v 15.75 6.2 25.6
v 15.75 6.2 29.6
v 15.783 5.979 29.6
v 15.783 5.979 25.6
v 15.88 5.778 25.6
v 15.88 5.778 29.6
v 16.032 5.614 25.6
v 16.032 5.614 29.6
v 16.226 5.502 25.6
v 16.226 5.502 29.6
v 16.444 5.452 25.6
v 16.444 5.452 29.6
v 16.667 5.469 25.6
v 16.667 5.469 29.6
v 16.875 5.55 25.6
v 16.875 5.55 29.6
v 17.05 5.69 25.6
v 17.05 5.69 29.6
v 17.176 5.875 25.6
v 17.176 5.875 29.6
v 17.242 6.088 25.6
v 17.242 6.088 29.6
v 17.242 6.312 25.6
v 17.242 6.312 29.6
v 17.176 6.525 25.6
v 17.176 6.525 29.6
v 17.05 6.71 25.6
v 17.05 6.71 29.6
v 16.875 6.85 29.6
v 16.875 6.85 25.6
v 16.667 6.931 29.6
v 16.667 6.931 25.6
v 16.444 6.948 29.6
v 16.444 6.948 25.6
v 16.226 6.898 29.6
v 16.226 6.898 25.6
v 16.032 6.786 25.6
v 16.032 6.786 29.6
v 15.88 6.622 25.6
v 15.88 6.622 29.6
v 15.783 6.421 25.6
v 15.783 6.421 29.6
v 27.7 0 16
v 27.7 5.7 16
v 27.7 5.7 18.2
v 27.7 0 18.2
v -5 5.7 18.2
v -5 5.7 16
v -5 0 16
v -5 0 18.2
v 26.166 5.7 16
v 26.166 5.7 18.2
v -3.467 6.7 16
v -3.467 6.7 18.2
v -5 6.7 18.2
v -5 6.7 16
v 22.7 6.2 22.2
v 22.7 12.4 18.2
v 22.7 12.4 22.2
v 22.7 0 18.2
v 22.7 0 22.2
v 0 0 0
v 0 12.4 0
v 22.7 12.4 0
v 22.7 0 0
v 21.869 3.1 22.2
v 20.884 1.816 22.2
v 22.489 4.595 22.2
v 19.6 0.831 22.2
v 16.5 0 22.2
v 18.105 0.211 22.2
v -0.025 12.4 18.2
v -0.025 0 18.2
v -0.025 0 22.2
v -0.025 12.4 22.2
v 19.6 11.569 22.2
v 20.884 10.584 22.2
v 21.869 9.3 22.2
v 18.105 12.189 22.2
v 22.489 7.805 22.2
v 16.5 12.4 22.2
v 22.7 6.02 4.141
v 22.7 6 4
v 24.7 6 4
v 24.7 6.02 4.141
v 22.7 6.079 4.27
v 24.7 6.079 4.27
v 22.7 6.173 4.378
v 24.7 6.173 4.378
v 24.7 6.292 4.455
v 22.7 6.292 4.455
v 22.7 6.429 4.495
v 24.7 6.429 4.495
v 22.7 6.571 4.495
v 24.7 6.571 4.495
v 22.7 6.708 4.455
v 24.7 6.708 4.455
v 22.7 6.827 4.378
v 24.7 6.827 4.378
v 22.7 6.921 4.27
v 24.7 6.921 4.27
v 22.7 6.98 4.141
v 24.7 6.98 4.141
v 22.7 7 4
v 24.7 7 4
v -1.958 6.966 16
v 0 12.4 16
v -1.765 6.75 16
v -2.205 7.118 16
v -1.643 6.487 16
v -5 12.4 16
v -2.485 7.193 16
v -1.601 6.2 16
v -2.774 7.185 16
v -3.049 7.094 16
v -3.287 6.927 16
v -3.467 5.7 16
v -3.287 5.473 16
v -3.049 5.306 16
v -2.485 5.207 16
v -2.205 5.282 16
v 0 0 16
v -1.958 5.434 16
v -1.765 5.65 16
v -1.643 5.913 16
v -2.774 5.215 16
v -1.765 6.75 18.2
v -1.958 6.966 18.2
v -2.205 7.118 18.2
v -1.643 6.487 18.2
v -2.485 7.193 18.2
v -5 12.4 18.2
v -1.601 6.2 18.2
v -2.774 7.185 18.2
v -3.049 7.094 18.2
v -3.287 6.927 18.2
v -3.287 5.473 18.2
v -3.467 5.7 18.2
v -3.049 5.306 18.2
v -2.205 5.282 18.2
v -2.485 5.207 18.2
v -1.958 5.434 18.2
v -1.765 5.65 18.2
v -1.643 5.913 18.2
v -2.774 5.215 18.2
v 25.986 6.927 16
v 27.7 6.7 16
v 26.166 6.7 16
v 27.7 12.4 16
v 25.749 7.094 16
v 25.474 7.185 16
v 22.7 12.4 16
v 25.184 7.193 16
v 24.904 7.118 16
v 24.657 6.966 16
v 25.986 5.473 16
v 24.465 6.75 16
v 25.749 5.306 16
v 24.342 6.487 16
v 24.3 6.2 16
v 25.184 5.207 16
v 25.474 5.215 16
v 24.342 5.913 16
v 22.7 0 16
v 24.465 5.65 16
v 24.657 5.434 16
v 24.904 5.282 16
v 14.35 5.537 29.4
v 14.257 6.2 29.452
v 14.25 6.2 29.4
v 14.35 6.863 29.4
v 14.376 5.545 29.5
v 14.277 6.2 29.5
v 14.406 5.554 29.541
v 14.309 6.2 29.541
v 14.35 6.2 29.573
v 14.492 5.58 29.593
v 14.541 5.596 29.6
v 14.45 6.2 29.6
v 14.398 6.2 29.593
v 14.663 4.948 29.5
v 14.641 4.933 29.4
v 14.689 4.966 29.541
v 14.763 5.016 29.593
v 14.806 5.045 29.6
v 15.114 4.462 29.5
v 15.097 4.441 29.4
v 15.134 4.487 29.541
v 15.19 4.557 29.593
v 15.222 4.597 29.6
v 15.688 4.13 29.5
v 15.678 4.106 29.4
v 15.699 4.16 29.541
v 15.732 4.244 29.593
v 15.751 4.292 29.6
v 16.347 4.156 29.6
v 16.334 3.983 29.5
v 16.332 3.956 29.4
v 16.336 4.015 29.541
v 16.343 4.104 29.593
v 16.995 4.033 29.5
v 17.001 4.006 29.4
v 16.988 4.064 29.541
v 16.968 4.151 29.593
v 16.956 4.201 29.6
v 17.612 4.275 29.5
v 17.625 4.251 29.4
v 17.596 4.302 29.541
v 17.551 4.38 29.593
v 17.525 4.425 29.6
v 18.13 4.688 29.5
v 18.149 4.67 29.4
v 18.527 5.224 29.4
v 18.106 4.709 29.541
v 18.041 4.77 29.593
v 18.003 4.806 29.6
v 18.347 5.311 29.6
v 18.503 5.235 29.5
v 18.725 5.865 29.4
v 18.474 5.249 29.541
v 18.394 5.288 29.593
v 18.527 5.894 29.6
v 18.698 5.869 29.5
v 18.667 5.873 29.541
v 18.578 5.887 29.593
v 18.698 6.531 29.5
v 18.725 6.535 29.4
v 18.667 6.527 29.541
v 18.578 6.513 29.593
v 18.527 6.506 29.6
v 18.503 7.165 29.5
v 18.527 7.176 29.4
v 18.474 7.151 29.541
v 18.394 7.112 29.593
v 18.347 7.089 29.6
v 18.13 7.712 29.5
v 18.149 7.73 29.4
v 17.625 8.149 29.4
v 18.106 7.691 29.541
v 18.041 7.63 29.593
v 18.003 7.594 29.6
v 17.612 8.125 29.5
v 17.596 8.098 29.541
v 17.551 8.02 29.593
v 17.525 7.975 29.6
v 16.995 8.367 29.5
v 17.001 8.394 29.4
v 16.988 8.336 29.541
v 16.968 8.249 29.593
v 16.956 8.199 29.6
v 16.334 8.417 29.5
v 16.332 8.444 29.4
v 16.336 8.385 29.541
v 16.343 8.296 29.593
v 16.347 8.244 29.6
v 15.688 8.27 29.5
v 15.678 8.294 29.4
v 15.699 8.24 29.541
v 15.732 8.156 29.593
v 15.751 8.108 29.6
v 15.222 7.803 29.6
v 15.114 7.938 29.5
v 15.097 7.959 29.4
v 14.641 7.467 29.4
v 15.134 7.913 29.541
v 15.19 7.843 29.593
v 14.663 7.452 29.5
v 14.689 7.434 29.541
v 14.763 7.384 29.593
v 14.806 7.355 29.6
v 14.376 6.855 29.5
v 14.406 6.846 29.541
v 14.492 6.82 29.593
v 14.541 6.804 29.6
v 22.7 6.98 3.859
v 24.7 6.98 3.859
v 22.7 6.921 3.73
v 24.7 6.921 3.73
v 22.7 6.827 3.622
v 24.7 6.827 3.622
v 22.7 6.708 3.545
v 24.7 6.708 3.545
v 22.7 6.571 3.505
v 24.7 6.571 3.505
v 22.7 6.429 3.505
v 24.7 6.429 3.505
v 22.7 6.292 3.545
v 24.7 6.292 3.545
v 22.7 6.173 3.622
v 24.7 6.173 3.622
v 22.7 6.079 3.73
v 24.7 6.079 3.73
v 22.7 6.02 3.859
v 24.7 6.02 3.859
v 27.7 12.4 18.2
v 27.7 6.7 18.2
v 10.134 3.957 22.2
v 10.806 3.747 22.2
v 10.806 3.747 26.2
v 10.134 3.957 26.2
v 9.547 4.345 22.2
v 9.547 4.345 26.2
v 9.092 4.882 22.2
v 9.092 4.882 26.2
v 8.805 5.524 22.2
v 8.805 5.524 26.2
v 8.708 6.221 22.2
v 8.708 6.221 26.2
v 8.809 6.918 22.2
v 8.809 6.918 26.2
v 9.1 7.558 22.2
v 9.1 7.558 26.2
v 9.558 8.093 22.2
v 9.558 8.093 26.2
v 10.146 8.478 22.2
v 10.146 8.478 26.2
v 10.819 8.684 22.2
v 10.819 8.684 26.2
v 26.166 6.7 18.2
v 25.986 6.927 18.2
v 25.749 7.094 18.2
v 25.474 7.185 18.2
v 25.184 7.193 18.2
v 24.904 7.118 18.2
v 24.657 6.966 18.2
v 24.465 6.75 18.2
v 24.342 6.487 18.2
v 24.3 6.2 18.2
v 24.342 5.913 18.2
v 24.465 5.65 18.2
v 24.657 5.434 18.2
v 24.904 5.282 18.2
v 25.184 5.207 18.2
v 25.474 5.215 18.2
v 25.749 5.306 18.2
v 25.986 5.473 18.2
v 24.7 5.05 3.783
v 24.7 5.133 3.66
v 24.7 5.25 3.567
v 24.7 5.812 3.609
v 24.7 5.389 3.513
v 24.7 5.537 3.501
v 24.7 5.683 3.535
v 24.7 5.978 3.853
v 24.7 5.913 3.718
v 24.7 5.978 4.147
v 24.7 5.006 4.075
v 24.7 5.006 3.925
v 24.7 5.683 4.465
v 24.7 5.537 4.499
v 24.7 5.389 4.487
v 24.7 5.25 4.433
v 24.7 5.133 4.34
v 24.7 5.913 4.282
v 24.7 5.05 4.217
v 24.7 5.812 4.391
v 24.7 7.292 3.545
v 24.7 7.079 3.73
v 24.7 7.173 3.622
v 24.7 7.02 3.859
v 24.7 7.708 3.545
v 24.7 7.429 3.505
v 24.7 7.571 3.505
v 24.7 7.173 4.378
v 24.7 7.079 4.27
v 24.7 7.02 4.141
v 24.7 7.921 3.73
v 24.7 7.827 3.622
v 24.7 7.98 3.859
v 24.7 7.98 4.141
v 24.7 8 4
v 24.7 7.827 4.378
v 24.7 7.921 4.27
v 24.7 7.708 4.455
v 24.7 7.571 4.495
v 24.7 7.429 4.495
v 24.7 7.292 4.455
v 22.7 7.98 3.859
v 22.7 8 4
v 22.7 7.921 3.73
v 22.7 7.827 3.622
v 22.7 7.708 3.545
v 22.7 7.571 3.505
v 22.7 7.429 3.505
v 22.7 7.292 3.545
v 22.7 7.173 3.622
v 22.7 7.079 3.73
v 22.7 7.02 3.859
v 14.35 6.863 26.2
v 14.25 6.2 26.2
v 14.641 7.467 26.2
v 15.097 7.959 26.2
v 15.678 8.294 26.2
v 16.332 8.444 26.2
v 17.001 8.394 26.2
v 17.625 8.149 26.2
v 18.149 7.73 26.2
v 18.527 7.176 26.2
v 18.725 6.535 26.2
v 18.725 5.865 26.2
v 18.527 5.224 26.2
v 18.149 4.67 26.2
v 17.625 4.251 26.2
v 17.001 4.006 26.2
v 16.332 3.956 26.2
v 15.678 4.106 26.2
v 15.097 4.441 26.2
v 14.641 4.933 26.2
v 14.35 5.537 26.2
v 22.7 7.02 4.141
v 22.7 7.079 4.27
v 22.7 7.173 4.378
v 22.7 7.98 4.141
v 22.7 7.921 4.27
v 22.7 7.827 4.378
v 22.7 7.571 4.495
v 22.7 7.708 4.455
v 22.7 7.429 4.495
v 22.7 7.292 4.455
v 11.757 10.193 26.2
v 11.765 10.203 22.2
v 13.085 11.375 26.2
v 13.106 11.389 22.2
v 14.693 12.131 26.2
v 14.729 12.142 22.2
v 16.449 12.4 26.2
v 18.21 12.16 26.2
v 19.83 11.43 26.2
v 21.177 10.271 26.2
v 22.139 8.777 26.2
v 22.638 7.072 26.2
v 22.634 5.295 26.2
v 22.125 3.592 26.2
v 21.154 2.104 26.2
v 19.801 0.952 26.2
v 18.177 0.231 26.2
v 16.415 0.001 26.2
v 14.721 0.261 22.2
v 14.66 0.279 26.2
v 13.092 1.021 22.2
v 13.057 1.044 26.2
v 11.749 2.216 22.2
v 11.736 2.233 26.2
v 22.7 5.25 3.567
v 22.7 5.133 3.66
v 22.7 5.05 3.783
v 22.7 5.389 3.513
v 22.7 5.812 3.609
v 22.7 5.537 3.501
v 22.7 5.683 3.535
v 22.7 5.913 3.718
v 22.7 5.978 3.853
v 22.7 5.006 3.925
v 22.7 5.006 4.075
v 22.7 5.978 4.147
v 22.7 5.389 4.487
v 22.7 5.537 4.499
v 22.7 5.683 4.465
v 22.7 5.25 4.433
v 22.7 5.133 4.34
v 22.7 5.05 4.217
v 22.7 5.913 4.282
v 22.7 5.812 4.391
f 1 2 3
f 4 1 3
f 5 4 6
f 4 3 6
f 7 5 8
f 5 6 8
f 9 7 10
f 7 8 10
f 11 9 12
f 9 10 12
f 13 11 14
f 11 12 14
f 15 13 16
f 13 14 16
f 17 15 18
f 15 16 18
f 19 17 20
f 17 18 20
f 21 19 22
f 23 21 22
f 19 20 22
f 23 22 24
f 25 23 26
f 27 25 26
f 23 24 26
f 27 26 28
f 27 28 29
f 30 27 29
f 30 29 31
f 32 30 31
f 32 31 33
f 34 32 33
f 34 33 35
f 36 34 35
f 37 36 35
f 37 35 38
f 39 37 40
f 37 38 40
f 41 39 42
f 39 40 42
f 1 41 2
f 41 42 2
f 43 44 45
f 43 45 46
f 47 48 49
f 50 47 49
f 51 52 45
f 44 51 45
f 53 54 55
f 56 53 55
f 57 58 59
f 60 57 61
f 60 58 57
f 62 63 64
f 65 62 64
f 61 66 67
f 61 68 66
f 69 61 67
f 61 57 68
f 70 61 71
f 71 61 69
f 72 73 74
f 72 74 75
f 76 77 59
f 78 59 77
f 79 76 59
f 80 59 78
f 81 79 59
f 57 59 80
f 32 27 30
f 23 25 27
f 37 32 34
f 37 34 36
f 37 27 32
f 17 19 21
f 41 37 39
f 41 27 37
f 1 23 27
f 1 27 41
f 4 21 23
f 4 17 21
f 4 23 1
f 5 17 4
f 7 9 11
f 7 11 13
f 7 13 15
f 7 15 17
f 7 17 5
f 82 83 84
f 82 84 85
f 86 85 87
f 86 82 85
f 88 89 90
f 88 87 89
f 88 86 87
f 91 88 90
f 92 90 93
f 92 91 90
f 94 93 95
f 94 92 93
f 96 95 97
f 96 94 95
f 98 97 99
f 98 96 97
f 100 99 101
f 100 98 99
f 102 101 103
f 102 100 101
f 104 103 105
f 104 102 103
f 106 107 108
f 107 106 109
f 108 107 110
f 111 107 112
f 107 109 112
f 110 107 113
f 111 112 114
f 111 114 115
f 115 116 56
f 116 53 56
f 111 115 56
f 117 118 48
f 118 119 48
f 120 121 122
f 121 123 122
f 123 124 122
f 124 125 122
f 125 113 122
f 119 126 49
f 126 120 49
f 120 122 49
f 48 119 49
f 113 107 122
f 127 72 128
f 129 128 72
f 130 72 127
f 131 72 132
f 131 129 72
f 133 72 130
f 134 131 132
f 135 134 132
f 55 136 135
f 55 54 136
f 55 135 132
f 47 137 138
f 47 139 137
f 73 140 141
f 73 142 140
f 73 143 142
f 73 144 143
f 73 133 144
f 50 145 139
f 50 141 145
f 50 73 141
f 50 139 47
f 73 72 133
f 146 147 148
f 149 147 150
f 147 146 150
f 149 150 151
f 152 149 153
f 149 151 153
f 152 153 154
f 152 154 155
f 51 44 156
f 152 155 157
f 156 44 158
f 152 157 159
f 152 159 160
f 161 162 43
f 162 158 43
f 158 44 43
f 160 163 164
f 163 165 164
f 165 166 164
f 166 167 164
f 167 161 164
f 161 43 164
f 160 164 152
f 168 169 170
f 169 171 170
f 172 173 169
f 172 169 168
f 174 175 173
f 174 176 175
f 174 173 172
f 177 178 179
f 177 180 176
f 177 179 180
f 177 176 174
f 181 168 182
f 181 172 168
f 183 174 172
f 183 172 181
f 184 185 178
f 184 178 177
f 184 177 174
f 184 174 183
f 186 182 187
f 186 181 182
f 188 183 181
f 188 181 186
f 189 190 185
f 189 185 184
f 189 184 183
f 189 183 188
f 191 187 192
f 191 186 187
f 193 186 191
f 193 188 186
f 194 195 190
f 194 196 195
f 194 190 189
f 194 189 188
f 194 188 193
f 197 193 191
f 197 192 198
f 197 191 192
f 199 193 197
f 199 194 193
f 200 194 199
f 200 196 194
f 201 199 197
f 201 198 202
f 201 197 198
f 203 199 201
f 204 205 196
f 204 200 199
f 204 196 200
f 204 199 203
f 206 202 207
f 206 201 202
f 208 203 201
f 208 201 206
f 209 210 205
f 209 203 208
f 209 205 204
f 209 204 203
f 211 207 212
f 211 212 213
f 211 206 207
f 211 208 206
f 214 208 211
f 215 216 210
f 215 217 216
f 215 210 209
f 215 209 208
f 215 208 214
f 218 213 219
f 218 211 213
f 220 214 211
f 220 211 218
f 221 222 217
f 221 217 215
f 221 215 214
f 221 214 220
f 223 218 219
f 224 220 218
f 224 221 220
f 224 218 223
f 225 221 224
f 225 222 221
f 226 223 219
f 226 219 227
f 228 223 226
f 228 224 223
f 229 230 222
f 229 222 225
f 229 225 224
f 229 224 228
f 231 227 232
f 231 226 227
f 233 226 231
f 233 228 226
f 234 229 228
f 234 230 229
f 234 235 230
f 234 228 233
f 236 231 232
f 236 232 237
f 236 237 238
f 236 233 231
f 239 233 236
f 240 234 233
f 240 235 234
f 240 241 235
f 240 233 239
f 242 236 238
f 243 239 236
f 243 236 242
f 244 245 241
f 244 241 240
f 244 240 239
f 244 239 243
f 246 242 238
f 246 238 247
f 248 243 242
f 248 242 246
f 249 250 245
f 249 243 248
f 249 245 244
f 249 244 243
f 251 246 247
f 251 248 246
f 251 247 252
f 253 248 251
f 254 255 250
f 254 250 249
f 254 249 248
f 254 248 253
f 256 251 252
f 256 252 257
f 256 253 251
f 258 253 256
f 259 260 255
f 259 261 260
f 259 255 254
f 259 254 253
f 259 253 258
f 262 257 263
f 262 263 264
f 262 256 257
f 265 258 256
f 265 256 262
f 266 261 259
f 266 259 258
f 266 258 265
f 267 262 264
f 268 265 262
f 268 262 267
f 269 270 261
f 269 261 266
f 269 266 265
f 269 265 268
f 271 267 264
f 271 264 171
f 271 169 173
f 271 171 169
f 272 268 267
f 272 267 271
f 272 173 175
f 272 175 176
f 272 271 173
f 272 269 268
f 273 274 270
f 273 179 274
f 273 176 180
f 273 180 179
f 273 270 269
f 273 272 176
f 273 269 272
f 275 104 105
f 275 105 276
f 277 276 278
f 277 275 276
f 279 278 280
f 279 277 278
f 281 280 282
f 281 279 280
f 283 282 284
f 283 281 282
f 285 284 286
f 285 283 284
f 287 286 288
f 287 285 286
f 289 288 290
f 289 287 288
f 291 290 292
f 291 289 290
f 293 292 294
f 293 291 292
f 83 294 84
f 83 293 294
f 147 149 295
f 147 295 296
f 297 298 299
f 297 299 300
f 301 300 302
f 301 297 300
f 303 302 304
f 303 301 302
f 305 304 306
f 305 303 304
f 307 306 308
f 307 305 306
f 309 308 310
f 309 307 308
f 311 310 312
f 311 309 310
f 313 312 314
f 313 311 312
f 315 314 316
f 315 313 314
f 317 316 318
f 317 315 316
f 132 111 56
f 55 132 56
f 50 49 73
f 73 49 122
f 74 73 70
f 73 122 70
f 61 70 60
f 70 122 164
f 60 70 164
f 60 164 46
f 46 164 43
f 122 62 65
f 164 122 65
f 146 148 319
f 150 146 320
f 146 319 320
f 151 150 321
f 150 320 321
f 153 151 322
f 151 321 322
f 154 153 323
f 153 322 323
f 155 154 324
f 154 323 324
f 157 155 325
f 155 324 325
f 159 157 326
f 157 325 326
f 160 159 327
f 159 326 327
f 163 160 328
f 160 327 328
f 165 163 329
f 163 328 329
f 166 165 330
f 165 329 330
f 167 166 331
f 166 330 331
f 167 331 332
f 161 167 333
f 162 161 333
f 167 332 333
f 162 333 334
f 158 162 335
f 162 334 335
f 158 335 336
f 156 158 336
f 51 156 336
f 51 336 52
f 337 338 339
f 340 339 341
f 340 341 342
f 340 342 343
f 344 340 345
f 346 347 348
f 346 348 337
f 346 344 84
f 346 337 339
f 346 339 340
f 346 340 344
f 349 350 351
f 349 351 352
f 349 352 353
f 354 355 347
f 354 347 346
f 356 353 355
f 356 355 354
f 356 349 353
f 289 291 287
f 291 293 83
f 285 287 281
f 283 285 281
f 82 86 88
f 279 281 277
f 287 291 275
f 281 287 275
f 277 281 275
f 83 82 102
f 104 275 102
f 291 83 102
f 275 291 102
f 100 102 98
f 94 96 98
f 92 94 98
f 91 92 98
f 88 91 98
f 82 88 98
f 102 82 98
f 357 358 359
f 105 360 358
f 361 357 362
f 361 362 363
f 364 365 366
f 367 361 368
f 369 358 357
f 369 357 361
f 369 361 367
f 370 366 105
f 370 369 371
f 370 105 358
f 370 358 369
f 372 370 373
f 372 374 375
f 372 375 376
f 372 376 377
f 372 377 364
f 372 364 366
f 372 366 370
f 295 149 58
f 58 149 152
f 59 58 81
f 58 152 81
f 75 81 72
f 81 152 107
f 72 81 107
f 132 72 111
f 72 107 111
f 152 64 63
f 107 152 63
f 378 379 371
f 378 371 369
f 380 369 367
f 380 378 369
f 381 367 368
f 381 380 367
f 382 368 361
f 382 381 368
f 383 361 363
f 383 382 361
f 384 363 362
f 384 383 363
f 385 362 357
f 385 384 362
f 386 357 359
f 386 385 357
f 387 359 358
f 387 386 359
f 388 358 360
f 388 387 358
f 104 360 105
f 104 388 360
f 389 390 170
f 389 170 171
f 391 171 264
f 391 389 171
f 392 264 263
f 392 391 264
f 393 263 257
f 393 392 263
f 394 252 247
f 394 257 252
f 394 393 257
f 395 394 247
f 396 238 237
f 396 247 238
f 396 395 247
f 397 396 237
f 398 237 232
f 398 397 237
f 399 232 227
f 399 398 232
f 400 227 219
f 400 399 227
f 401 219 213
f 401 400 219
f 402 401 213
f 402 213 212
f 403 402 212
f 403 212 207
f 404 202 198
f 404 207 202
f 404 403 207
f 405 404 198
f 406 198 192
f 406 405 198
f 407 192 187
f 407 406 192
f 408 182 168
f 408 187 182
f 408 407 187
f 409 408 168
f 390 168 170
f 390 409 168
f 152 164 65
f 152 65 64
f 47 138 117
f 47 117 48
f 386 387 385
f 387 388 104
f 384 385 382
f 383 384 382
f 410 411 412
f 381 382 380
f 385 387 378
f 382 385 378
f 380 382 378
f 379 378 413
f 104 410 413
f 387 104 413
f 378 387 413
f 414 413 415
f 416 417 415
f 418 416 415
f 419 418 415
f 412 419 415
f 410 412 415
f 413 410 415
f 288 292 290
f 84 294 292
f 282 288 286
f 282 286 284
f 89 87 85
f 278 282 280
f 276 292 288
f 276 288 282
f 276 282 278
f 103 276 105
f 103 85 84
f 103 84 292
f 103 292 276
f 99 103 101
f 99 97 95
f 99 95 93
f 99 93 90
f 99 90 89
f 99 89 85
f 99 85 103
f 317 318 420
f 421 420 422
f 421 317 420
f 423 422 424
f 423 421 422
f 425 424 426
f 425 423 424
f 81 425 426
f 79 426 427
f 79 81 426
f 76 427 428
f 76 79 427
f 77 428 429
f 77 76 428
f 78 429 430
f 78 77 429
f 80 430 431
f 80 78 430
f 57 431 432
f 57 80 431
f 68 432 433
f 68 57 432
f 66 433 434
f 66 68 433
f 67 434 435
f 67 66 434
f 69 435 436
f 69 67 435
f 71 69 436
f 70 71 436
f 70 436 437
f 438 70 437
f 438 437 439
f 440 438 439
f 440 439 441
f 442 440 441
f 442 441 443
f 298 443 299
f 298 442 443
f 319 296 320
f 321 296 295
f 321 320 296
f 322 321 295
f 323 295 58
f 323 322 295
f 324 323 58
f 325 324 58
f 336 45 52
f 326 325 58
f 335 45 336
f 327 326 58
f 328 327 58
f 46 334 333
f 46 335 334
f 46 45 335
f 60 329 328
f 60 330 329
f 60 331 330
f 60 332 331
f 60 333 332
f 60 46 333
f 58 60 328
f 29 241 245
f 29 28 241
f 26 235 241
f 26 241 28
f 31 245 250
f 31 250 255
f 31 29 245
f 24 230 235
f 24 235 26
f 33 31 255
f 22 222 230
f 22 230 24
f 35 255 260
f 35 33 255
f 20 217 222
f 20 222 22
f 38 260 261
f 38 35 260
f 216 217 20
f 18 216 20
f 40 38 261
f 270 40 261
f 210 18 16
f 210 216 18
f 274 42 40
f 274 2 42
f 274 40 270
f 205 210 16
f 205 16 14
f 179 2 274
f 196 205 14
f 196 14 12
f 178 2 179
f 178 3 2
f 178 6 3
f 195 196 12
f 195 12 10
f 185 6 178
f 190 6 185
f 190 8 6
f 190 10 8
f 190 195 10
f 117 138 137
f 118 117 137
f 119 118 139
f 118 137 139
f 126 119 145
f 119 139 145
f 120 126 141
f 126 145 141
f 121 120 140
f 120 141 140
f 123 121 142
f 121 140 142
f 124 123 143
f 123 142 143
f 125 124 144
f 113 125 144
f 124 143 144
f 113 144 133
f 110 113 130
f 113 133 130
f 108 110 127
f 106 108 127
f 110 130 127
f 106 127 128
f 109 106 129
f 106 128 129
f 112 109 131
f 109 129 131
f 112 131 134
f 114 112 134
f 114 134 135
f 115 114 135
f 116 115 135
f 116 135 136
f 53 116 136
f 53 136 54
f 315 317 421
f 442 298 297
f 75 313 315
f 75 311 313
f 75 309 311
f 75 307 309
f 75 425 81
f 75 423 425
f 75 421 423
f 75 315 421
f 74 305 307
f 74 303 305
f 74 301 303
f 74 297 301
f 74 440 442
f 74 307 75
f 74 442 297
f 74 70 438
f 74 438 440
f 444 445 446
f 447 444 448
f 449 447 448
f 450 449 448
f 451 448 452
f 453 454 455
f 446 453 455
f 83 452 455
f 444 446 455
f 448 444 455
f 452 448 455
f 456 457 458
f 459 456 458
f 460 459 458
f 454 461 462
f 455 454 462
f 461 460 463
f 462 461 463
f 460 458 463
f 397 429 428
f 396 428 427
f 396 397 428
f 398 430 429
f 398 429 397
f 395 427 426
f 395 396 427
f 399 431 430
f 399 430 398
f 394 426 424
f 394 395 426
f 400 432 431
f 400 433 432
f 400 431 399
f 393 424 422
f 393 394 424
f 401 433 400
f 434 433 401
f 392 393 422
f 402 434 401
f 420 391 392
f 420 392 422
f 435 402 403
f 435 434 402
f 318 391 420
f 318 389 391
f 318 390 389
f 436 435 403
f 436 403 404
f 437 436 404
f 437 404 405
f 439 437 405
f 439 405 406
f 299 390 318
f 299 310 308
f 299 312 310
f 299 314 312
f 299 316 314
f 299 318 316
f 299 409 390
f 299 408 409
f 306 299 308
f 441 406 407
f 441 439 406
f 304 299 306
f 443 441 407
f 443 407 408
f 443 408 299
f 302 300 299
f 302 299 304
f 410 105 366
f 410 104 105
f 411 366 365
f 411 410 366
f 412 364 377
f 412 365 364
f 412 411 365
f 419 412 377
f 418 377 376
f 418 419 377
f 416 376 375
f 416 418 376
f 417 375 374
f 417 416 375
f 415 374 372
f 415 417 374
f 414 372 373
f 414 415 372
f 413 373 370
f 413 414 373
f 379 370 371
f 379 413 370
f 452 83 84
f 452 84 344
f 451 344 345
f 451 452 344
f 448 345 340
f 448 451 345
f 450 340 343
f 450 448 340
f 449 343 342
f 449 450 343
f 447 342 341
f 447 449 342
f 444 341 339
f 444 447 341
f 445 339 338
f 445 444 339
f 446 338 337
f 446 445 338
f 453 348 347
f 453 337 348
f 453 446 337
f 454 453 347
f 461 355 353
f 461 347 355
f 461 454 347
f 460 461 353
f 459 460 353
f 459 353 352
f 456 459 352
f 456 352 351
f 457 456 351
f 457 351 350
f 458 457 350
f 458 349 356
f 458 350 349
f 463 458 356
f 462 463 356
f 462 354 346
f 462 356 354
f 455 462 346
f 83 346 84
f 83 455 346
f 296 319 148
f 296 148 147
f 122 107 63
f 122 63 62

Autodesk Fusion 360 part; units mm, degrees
sketch "alap" plane through (0, 0, 0) normal (0, 0, 1) x (1, 0, 0)
  line L0 (0, 0) -> (22.7, 0)
  line L1 (22.7, 0) -> (22.7, 12.4)
  line L2 (22.7, 12.4) -> (0, 12.4)
  line L3 (0, 12.4) -> (0, 0)
  dimension "d1" = 22.7
  dimension "d2" = 12.4
extrude "Extrude1" add sketch "alap" along normal blind 16 makes body 1
sketch "felso_alap" plane through (0, 0, 16) normal (0, 0, 1) x (-1, 0, 0)
  line L0 (0, 0) -> (-22.7, 0)
  line L1 (-22.7, -12.4) -> (0, -12.4)
  line L2 (0, 0) -> (-22.7, 0)
  line L3 (-22.7, 0) -> (-27.7, 0)
  line L4 (0, 0) -> (5, 0)
  line L5 (5, 0) -> (-22.7, 0)
  line L6 (-22.7, -12.4) -> (5, -12.4)
  line L7 (5, -12.4) -> (5, 0)
  line L8 (-27.7, 0) -> (-22.7, 0)
  line L9 (-22.7, -12.4) -> (-27.7, -12.4)
  line L10 (-27.7, -12.4) -> (-27.7, 0)
  dimension "d5" = 5
  dimension "d6" = 5
extrude "Extrude2" add sketch "felso_alap" along normal blind 2.2 bodies 1
sketch "felso_teto" plane through (0, 0, 18.2) normal (0, 0, 1) x (-1, 0, 0)
  line L0 (-27.7, -12.4) -> (5, -12.4)
  line L1 (5, -12.4) -> (5, 0)
  line L2 (5, 0) -> (-27.7, 0)
  line L3 (-27.7, 0) -> (-27.7, -12.4)
  line L4 (0.0248, -12.4) -> (-22.7, -12.4)
  line L5 (-22.7, -12.4) -> (-22.7, 0)
  line L6 (-22.7, 0) -> (0.0248, 0)
  line L7 (0.0248, 0) -> (0.0248, -12.4)
extrude "Extrude3" add sketch "felso_teto" along normal blind 4 separate body contours L0 L2 L4 L5 L6 L7 makes body 2
combine "Combine1" operation add target body 2 tool bodies 1
sketch "gear_haus" plane through (0, 0, 22.2) normal (0, 0, 1) x (-1, 0, 0)
  line L0 (0.0248, 0) -> (-22.7, 0)
  line L1 (-22.7, 0) -> (-22.7, -12.4)
  line L2 (-22.7, -12.4) -> (0.0248, -12.4)
  line L3 (0.0248, -12.4) -> (0.0248, 0)
  circle A0 centre (-16.5, -6.2) radius 6.2
  line L4 (-22.7, -6.2144) -> (-8.7, -6.2144) construction
  circle A1 centre (-11.2076, -6.2144) radius 2.5
  dimension "d11" = 12.4
  dimension "d14" = 14
  dimension "d16" = 5
extrude "Extrude4" add sketch "gear_haus" along normal blind 4 contours A0 A1 | A0 A1 | A0 A1 bodies 2
sketch "Sketch7" plane through (0, 0, 26.2) normal (0, 0, 1) x (-1, 0, 0)
  arc A0 (-10.8194, -8.6841) -> (-10.806, -3.7469) centre (-11.2076, -6.2144) ccw
  arc A1 (-10.806, -3.7469) -> (-10.8194, -8.6841) centre (-16.5, -6.2) ccw
  circle A2 centre (-16.5, -6.2) radius 2.25
  dimension "d19" = 4.5
extrude "Extrude5" add sketch "Sketch7" along normal blind 3.4 contours A2 bodies 2
sketch "Sketch8" plane through (0, 0, 29.6) normal (0, 0, 1) x (-1, 0, 0)
  circle A0 centre (-16.5, -6.2) radius 2.25
  circle A1 centre (-16.5, -6.2) radius 0.75
  dimension "d22" = 1.5
extrude "Extrude6" cut sketch "Sketch8" against normal blind 4 contours A1 bodies 2
fillet "Fillet1" radius 0.2 1 edges at (18.5977, 7.0136, 29.6) on bodies 2
sketch "Sketch10" plane through (0, 0, 18.2) normal (0, 0, 1) x (-1, 0, 0)
  line L0 (-22.7, -12.4) -> (-22.7, 0)
  line L1 (-22.7, 0) -> (-27.7, 0)
  line L2 (-27.7, 0) -> (-27.7, -12.4)
  line L3 (-27.7, -12.4) -> (-22.7, -12.4)
  line L4 (5.7217, -6.2) -> (-31, -6.2) construction
  line L5 (-25.3, -6.2) -> (-25.3, -6.7)
  line L6 (-25.3, -6.7) -> (-27.7, -6.7)
  line L7 (-27.7, -6.7) -> (-27.7, -6.2)
  line L8 (-25.3, -6.2) -> (-25.3, -5.7)
  line L9 (-25.3, -5.7) -> (-27.7, -5.7)
  line L10 (-27.7, -5.7) -> (-27.7, -6.2)
  circle A0 centre (-25.3, -6.2) radius 1
  line L11 (5.0007, -12.4) -> (-27.7, -12.4) construction
  line L12 (-11.3497, -12.4) -> (-11.3497, 3) construction
  circle A1 centre (2.6007, -6.2) radius 1
  line L13 (2.6007, -5.7) -> (5.0007, -5.7)
  line L14 (2.6007, -6.2) -> (2.6007, -5.7)
  line L15 (2.6007, -6.2) -> (2.6007, -6.7)
  line L16 (2.6007, -6.7) -> (5.0007, -6.7)
  line L17 (5.0007, -6.7) -> (5.0007, -5.7)
  dimension "d30" = 2.4
  dimension "d31" = 0.5
  dimension "d32" = 2
extrude "Extrude7" cut sketch "Sketch10" against normal blind 4 contours L2 L6 L7 L9 L10 A0 | L5 L6 L8 L9 A0 | L5 L6 L8 L9 A0 bodies 2
extrude "Extrude8" cut sketch "Sketch10" against normal blind 4 contours A1 L13 L14 L15 L16 | A1 L13 L16 L17 | A1 L13 L14 L15 L16 bodies 2
sketch "vezetek" plane through (22.7, 0, 0) normal (1, 0, 0) x (0, 1, 0)
  line L0 (0, 0) -> (12.4, 0)
  line L1 (12.4, 0) -> (12.4, 16)
  line L2 (12.4, 16) -> (0, 16)
  line L3 (0, 16) -> (0, 0)
  circle A0 centre (5.5, 4) radius 0.5
  circle A1 centre (6.5, 4) radius 0.5
  circle A2 centre (7.5, 4) radius 0.5
  line L4 (6.5, 0) -> (6.5, 4) construction
  line L5 (0, 4) -> (4, 4) construction
  dimension "d37" = 1
  dimension "d38" = 1
  dimension "d39" = 4
  dimension "d40" = 4
extrude "Extrude9" add sketch "vezetek" along normal blind 2 separate body contours A0 | A2 | A1 makes body 3 at (24.0333, 7.6354, 4.4813)
